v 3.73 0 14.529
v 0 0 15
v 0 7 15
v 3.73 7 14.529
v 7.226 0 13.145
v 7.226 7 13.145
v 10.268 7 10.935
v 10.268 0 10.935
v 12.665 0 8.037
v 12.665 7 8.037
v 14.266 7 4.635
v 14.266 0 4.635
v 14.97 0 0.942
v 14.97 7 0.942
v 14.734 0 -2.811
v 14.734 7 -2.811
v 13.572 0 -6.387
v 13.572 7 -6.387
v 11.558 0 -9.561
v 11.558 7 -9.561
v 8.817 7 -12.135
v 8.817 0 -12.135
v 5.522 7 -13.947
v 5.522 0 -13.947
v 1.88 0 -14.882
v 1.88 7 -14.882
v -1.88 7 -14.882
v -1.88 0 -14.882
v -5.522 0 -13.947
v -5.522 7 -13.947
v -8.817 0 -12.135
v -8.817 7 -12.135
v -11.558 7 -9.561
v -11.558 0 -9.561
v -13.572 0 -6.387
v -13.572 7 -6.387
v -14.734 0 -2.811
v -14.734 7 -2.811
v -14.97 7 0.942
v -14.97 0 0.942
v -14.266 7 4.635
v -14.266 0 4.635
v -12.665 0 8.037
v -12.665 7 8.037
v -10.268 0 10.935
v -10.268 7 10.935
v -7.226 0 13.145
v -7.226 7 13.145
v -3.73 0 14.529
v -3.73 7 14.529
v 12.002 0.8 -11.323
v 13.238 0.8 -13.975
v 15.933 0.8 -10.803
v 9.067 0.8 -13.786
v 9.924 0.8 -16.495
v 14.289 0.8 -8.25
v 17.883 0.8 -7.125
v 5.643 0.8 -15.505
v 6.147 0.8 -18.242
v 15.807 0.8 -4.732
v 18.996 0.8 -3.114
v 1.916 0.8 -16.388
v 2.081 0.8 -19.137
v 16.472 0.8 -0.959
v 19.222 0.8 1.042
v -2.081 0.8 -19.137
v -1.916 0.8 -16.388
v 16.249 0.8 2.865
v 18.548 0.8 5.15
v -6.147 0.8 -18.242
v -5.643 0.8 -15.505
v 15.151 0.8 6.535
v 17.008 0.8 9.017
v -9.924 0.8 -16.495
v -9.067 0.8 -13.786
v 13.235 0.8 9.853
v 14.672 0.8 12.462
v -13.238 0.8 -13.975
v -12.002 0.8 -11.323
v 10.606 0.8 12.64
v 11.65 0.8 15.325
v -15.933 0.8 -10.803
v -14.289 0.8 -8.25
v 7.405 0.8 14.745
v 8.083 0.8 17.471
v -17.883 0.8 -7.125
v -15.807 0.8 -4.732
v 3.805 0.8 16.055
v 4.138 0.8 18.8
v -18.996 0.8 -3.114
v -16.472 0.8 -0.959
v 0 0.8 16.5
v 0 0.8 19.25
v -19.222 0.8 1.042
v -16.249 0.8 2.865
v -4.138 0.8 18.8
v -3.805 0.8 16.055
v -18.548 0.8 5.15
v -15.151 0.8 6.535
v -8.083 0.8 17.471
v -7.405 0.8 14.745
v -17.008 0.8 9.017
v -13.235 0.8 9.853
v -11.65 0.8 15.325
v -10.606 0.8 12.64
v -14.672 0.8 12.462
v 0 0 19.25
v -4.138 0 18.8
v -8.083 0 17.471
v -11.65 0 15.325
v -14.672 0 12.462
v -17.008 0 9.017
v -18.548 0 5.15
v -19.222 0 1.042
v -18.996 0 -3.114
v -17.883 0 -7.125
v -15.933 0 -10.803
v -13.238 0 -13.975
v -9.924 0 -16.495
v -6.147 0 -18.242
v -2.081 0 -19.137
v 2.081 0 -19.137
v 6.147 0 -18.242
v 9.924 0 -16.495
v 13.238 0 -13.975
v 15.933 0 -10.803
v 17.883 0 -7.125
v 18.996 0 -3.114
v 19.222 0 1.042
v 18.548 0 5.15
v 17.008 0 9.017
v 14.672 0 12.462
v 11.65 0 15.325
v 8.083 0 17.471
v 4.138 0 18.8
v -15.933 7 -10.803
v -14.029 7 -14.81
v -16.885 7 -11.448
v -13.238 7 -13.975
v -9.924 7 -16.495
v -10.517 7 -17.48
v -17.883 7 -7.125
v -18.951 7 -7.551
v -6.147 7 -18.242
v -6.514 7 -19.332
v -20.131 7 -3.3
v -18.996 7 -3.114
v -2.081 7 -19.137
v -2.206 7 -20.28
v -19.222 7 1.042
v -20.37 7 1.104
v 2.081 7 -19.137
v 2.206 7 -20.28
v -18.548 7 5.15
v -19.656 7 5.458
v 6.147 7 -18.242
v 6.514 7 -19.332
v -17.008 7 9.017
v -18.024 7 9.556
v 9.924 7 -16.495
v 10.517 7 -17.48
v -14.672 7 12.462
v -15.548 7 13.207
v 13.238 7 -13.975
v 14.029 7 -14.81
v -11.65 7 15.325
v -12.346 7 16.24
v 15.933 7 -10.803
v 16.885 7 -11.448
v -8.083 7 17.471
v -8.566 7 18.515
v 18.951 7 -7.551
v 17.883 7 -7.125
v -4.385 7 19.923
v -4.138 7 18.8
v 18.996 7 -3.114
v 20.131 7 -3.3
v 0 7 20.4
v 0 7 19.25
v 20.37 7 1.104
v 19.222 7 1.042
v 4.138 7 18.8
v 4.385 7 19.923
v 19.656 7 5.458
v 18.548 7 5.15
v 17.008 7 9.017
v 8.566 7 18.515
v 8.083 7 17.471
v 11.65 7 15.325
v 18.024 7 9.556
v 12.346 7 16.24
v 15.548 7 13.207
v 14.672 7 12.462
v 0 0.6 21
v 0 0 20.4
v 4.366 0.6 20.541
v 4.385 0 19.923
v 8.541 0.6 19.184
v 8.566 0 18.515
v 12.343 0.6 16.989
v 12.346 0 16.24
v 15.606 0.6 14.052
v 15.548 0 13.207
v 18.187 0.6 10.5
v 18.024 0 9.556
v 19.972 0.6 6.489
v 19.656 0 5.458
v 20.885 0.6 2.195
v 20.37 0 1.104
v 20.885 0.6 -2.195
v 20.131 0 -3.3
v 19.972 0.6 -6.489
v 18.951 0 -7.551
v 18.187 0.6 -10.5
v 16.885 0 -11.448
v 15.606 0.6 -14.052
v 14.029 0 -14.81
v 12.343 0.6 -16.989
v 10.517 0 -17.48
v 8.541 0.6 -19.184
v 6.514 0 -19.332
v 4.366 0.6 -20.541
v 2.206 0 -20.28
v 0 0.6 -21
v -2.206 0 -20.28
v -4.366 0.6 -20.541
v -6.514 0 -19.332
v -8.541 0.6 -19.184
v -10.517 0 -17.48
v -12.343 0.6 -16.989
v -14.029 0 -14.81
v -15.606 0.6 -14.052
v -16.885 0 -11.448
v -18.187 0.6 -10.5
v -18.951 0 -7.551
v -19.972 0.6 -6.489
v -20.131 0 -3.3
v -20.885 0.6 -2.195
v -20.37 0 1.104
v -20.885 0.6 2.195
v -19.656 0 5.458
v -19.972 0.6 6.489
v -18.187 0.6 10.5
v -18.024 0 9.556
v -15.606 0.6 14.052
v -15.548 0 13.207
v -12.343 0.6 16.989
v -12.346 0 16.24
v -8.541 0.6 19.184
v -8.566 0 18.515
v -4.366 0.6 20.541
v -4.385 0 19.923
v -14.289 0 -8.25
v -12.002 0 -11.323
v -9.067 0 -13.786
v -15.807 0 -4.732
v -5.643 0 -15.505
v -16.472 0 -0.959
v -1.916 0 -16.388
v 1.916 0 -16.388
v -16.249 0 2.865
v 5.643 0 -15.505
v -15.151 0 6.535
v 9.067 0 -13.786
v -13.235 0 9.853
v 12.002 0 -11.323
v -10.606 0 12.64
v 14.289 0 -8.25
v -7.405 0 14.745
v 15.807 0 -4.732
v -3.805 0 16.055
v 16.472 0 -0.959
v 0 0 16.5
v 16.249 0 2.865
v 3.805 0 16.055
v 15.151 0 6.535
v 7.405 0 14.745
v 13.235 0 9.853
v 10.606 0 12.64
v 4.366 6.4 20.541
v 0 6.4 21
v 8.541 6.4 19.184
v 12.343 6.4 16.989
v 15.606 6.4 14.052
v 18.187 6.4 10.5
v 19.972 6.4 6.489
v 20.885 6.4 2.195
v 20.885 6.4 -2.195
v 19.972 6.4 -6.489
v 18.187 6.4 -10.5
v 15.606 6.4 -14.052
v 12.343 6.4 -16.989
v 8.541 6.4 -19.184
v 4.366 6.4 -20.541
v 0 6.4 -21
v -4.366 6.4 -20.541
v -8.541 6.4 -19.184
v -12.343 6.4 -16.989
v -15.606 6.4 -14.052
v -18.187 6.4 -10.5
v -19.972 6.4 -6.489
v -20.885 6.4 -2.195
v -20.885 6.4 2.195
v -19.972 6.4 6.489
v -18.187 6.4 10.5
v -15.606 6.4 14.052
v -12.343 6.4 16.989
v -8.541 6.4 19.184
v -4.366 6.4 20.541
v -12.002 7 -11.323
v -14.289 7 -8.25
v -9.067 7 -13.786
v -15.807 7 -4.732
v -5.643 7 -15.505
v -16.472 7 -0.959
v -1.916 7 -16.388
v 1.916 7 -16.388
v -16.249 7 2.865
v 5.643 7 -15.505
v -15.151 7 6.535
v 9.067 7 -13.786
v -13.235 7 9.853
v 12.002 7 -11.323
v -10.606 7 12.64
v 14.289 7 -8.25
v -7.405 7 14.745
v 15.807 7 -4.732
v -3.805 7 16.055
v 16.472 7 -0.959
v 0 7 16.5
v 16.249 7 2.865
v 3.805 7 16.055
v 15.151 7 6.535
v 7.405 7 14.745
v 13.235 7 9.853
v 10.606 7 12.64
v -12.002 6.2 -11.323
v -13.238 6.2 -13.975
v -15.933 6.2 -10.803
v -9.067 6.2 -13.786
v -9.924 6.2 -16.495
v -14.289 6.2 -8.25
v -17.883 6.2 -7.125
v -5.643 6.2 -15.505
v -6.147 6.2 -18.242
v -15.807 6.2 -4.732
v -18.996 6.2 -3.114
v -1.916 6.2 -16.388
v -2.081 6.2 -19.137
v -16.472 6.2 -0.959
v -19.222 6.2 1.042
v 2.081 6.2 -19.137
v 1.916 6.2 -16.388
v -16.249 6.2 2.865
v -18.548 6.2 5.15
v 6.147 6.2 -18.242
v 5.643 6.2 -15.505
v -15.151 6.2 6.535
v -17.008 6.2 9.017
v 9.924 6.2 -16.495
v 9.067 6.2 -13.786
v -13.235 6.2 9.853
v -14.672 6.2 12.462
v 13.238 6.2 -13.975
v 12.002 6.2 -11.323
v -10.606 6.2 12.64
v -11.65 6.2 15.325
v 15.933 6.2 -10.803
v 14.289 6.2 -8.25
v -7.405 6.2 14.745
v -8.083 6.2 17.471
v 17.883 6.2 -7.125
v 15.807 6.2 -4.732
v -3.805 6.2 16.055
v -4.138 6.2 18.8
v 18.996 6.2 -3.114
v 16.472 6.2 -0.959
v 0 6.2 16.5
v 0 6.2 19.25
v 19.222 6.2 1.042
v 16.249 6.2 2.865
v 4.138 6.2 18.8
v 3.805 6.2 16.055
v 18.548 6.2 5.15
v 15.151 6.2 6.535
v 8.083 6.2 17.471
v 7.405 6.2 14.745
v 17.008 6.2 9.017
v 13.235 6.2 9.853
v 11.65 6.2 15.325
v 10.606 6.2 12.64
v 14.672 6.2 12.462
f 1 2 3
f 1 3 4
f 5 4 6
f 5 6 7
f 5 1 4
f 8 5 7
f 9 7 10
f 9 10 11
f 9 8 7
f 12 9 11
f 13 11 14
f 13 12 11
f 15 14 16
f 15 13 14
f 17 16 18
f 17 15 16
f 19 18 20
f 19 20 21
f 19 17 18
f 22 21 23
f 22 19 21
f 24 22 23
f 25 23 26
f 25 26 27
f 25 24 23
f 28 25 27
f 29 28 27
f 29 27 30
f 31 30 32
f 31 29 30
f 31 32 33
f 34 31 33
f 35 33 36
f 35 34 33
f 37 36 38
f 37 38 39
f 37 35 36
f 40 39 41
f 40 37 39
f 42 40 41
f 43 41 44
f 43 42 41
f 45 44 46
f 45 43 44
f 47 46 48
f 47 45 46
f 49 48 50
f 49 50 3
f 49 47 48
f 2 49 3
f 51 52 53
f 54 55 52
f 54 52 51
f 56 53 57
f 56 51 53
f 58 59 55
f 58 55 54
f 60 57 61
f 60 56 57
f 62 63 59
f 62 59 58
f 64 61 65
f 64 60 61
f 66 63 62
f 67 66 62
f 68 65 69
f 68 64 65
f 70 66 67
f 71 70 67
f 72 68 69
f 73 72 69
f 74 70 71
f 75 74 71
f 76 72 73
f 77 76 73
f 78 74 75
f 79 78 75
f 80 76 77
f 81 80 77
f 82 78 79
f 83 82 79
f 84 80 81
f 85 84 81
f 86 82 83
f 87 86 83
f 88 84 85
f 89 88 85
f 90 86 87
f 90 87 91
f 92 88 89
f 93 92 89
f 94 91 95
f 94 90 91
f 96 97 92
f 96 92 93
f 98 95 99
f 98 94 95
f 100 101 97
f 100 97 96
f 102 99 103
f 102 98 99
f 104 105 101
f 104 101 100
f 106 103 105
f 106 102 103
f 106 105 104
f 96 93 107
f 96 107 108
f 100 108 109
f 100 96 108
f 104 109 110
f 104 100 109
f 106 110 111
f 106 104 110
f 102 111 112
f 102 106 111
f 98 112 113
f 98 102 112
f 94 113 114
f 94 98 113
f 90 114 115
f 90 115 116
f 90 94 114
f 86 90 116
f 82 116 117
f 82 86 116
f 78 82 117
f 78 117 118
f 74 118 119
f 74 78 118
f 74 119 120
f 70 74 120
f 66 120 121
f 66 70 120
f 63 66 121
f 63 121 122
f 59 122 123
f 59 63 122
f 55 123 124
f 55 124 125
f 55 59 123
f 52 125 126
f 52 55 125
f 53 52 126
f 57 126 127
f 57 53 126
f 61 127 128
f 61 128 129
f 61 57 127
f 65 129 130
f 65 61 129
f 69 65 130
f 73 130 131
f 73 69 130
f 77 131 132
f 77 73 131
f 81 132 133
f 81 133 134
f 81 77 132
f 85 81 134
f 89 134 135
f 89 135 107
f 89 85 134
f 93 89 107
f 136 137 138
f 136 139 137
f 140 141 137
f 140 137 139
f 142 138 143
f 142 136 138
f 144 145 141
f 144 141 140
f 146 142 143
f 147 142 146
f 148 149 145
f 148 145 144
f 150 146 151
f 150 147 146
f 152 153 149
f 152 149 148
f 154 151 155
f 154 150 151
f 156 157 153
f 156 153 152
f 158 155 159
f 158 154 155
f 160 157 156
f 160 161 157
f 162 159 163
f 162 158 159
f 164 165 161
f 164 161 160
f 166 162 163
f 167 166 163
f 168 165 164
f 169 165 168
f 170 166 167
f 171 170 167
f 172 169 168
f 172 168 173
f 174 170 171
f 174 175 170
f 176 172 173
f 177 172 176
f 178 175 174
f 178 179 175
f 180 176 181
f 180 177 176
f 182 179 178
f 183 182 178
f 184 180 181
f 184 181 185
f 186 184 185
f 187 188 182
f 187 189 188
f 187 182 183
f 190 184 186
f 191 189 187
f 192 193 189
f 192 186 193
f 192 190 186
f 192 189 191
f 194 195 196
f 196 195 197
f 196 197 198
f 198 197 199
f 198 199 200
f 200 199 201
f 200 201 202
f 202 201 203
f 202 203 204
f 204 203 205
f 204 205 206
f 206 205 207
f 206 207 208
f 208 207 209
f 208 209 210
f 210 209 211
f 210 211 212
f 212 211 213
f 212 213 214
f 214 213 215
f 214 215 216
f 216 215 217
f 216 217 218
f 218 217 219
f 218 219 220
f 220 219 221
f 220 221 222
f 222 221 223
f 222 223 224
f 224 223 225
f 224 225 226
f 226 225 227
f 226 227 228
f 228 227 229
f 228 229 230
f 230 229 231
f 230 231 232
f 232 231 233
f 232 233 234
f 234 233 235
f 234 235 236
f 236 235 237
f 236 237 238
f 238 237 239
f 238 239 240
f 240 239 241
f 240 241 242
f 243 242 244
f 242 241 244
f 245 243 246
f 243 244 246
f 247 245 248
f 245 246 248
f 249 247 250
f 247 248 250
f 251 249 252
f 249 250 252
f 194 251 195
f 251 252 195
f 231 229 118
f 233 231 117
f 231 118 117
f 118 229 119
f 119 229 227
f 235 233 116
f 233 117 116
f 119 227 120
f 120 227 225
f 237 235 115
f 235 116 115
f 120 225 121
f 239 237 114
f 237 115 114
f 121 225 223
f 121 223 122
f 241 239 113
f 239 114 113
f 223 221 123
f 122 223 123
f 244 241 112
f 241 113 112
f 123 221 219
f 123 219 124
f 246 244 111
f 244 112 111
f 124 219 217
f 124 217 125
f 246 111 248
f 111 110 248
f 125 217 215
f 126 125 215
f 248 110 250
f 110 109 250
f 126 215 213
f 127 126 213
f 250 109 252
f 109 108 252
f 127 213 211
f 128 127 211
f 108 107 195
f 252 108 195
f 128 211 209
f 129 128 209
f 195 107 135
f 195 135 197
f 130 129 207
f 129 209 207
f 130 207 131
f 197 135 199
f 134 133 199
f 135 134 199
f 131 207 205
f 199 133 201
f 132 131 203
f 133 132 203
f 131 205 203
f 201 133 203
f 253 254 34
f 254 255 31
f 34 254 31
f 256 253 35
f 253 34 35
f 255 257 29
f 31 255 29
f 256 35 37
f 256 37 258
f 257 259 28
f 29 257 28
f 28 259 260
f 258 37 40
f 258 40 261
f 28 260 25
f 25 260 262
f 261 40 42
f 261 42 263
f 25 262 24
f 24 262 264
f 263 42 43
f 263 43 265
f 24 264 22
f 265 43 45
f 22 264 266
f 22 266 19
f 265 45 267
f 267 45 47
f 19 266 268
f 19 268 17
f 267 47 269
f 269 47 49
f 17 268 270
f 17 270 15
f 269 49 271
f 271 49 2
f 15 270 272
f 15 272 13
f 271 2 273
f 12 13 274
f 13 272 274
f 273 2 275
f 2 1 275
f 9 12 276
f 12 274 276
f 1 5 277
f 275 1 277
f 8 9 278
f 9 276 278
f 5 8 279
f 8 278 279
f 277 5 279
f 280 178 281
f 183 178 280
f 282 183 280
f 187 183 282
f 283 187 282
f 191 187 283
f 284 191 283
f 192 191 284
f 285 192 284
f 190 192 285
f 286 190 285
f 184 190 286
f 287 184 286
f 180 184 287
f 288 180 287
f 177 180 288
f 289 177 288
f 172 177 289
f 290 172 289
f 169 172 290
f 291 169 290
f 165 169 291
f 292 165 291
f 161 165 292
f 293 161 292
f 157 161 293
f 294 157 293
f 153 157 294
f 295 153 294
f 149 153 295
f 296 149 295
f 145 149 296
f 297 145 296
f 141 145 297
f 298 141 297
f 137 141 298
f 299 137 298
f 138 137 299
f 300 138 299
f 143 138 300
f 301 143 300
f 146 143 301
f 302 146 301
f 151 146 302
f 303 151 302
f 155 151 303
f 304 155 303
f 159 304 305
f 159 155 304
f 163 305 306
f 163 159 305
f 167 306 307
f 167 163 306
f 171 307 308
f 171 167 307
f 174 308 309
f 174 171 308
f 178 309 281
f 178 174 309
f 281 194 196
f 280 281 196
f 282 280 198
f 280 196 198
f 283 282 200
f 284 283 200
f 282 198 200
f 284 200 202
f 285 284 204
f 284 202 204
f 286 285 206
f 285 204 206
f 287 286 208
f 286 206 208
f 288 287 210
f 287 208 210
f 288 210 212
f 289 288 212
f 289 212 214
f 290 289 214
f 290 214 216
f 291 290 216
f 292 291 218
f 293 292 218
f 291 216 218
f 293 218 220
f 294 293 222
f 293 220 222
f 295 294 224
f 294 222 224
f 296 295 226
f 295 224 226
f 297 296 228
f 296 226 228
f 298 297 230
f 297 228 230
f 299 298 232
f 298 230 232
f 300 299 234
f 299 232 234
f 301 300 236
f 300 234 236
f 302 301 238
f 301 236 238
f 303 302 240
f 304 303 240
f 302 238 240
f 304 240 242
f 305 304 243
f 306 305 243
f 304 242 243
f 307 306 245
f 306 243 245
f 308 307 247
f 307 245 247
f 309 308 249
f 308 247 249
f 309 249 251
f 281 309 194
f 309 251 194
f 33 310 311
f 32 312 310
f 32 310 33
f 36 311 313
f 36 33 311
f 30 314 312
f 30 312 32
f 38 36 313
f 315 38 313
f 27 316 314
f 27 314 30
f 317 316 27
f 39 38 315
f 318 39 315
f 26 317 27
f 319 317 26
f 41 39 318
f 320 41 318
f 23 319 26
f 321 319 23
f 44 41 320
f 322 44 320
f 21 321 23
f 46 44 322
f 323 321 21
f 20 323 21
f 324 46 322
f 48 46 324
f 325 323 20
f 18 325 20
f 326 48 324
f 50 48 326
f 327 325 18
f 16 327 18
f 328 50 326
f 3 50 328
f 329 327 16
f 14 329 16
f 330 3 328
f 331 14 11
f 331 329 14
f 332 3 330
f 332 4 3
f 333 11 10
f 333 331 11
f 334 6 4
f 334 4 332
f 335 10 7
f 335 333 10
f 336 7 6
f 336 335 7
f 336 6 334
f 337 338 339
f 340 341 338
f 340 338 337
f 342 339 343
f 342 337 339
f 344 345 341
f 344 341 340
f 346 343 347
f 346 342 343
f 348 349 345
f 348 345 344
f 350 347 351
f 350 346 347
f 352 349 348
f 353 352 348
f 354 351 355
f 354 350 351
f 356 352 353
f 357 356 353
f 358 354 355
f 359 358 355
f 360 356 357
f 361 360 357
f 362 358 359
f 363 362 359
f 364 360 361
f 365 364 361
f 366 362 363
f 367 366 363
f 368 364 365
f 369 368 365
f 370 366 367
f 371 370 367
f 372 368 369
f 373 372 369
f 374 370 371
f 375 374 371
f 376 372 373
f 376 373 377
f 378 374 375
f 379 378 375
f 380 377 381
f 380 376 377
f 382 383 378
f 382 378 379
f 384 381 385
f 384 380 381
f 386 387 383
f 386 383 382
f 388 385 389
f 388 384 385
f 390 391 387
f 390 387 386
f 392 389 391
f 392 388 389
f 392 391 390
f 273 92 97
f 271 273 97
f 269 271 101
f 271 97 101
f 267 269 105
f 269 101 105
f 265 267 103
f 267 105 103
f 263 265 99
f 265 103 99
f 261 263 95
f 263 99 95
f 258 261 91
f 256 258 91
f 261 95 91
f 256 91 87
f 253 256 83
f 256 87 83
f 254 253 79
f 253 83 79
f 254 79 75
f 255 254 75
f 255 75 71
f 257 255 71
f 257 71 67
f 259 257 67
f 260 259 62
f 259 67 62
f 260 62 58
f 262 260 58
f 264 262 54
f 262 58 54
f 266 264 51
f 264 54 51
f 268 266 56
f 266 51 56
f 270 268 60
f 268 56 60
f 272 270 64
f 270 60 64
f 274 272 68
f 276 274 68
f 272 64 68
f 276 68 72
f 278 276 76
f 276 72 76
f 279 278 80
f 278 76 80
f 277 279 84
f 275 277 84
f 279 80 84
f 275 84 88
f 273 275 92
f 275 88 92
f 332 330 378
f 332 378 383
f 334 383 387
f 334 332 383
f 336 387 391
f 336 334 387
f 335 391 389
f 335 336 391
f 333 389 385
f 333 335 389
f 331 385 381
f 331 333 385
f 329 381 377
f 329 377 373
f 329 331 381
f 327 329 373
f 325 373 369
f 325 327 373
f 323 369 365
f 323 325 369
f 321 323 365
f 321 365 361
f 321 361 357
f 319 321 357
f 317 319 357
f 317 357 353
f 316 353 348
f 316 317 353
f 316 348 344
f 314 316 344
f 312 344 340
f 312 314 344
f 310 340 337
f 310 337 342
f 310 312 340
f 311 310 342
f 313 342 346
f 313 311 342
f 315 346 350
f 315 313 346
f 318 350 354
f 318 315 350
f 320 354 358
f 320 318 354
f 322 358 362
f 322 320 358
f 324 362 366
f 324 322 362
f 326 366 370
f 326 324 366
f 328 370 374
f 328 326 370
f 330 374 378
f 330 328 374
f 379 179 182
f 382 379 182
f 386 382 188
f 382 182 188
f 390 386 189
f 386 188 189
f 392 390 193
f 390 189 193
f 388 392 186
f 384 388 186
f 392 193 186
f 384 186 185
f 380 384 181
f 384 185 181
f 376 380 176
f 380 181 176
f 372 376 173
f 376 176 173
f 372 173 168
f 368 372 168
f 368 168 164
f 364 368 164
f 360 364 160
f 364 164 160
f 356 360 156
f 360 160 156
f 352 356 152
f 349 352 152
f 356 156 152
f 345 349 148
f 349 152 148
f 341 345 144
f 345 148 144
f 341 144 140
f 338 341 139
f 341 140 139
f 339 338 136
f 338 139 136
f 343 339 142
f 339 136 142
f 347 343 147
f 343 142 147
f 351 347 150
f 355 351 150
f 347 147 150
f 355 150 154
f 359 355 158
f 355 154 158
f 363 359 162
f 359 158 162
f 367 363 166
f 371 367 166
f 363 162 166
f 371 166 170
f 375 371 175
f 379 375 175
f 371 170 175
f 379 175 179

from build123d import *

# Parameters (mm, degrees)
SKETCH_1_R          = 21
SKETCH_1_R_2        = 15
EXTRUDE_1_DEPTH     = 7
CHAMFER_1_SIZE      = 0.6
SKETCH_2_R          = 19.25
SKETCH_2_R_2        = 16.5
CUT_EXTRUDE_1_DEPTH = 0.8
CUT_EXTRUDE_START   = -0.8
SKETCH_3_R          = 19.25
SKETCH_3_R_2        = 16.5
CUT_EXTRUDE_3_DEPTH = 0.8


with BuildPart() as part:
    # 草图1 → 凸台-拉伸1 (new body)
    with BuildSketch(Plane(origin=(0, 0, 0), x_dir=(1, 0, 0), z_dir=(0, 1, 0))):
        with Locations(Location((0, 0, 0), (0, 0, 270))):
            Circle(SKETCH_1_R)
        with Locations(Location((0, 0, 0), (0, 0, 270))):
            Circle(SKETCH_1_R_2, mode=Mode.SUBTRACT)
    extrude(amount=EXTRUDE_1_DEPTH)

    # 倒角1
    chamfer_1_edges = [part.edges().sort_by_distance(p)[0] for p in [
        (0, 0, -21),
        (0, 7, -21),
    ]]
    chamfer(chamfer_1_edges, length=CHAMFER_1_SIZE)

    # 草图2 → 切除-拉伸1 (cut)
    with BuildSketch(Plane(origin=(0, 7, 0), x_dir=(1, 0, 0), z_dir=(0, 1, 0))):
        with Locations(Location((0, 0, 0), (0, 0, 270))):
            Circle(SKETCH_2_R)
        with Locations(Location((0, 0, 0), (0, 0, 270))):
            Circle(SKETCH_2_R_2, mode=Mode.SUBTRACT)
    extrude(amount=-CUT_EXTRUDE_1_DEPTH, mode=Mode.SUBTRACT)

    # 草图3 → 切除-拉伸3 (cut)
    with BuildSketch(Plane.XZ.offset(CUT_EXTRUDE_START)):
        with Locations(Location((0, 0, 0), (0, 0, 90))):
            Circle(SKETCH_3_R)
        with Locations(Location((0, 0, 0), (0, 0, 90))):
            Circle(SKETCH_3_R_2, mode=Mode.SUBTRACT)
    extrude(amount=CUT_EXTRUDE_3_DEPTH, mode=Mode.SUBTRACT)


solid = part.part
